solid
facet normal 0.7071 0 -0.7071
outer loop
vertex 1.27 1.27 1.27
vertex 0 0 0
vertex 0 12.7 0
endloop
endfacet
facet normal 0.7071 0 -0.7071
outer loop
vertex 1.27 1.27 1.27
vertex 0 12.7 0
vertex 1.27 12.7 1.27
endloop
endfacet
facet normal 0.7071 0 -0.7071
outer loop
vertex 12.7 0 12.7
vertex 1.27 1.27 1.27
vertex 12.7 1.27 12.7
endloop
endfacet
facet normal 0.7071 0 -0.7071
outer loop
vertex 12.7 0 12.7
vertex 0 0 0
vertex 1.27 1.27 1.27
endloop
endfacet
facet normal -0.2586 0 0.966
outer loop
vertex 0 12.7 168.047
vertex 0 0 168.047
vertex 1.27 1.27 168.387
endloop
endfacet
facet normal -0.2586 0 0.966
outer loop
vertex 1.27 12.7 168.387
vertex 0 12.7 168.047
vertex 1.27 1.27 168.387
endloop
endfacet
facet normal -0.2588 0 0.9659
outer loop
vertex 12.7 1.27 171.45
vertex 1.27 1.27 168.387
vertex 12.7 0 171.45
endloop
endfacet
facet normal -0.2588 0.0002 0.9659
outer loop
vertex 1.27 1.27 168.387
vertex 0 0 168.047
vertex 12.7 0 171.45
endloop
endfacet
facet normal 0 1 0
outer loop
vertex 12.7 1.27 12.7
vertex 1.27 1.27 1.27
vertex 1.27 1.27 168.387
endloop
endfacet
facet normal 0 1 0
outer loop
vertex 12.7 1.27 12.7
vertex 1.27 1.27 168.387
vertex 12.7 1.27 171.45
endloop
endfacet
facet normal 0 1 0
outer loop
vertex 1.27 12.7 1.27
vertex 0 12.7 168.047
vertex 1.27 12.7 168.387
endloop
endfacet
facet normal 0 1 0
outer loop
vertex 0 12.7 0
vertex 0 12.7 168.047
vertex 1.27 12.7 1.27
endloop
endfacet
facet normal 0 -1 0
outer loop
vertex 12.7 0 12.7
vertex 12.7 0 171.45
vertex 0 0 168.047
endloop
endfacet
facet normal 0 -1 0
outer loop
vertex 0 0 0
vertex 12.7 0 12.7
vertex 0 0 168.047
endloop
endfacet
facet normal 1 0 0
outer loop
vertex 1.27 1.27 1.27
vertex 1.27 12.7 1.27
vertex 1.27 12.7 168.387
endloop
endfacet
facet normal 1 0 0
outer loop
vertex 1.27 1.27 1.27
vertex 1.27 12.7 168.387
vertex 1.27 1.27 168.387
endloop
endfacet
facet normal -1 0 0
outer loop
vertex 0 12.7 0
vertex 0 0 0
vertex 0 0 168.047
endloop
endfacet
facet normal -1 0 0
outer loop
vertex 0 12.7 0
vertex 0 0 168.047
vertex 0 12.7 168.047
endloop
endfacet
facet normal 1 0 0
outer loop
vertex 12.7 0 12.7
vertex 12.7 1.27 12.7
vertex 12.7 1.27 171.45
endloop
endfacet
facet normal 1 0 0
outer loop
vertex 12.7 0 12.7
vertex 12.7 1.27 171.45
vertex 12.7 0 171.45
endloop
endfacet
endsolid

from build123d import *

# Parameters (mm, degrees)
BOSS_EXTRUDE1_DEPTH     = 171.45
CUT_EXTRUDE1_DEPTH      = 173.299266975
CUT_EXTRUDE1_DEPTH_BACK = 173.299266975


with BuildPart() as part:
    # Sketch1 → Boss-Extrude1 (new body)
    with BuildSketch(Plane.XY):
        Polygon((0, 0), (0, 12.7), (1.27, 12.7), (1.27, 1.27), (12.7, 1.27), (12.7, 0), align=None)
    extrude(amount=BOSS_EXTRUDE1_DEPTH)

    # Sketch2 → Cut-Extrude1 (cut, two sides: drawn at the far end of the back side and taken through both)
    with BuildSketch(Plane(origin=(0, 1.27, 0), x_dir=(1, 0, 0), z_dir=(0, 1, 0)).offset(-CUT_EXTRUDE1_DEPTH_BACK)):
        Polygon((0, -168.047045256), (12.7, -171.45), (0, -171.45), align=None)
        Polygon((0, 0), (12.7, -12.7), (12.7, 0), align=None)
    extrude(amount=CUT_EXTRUDE1_DEPTH + CUT_EXTRUDE1_DEPTH_BACK, mode=Mode.SUBTRACT)


solid = part.part
